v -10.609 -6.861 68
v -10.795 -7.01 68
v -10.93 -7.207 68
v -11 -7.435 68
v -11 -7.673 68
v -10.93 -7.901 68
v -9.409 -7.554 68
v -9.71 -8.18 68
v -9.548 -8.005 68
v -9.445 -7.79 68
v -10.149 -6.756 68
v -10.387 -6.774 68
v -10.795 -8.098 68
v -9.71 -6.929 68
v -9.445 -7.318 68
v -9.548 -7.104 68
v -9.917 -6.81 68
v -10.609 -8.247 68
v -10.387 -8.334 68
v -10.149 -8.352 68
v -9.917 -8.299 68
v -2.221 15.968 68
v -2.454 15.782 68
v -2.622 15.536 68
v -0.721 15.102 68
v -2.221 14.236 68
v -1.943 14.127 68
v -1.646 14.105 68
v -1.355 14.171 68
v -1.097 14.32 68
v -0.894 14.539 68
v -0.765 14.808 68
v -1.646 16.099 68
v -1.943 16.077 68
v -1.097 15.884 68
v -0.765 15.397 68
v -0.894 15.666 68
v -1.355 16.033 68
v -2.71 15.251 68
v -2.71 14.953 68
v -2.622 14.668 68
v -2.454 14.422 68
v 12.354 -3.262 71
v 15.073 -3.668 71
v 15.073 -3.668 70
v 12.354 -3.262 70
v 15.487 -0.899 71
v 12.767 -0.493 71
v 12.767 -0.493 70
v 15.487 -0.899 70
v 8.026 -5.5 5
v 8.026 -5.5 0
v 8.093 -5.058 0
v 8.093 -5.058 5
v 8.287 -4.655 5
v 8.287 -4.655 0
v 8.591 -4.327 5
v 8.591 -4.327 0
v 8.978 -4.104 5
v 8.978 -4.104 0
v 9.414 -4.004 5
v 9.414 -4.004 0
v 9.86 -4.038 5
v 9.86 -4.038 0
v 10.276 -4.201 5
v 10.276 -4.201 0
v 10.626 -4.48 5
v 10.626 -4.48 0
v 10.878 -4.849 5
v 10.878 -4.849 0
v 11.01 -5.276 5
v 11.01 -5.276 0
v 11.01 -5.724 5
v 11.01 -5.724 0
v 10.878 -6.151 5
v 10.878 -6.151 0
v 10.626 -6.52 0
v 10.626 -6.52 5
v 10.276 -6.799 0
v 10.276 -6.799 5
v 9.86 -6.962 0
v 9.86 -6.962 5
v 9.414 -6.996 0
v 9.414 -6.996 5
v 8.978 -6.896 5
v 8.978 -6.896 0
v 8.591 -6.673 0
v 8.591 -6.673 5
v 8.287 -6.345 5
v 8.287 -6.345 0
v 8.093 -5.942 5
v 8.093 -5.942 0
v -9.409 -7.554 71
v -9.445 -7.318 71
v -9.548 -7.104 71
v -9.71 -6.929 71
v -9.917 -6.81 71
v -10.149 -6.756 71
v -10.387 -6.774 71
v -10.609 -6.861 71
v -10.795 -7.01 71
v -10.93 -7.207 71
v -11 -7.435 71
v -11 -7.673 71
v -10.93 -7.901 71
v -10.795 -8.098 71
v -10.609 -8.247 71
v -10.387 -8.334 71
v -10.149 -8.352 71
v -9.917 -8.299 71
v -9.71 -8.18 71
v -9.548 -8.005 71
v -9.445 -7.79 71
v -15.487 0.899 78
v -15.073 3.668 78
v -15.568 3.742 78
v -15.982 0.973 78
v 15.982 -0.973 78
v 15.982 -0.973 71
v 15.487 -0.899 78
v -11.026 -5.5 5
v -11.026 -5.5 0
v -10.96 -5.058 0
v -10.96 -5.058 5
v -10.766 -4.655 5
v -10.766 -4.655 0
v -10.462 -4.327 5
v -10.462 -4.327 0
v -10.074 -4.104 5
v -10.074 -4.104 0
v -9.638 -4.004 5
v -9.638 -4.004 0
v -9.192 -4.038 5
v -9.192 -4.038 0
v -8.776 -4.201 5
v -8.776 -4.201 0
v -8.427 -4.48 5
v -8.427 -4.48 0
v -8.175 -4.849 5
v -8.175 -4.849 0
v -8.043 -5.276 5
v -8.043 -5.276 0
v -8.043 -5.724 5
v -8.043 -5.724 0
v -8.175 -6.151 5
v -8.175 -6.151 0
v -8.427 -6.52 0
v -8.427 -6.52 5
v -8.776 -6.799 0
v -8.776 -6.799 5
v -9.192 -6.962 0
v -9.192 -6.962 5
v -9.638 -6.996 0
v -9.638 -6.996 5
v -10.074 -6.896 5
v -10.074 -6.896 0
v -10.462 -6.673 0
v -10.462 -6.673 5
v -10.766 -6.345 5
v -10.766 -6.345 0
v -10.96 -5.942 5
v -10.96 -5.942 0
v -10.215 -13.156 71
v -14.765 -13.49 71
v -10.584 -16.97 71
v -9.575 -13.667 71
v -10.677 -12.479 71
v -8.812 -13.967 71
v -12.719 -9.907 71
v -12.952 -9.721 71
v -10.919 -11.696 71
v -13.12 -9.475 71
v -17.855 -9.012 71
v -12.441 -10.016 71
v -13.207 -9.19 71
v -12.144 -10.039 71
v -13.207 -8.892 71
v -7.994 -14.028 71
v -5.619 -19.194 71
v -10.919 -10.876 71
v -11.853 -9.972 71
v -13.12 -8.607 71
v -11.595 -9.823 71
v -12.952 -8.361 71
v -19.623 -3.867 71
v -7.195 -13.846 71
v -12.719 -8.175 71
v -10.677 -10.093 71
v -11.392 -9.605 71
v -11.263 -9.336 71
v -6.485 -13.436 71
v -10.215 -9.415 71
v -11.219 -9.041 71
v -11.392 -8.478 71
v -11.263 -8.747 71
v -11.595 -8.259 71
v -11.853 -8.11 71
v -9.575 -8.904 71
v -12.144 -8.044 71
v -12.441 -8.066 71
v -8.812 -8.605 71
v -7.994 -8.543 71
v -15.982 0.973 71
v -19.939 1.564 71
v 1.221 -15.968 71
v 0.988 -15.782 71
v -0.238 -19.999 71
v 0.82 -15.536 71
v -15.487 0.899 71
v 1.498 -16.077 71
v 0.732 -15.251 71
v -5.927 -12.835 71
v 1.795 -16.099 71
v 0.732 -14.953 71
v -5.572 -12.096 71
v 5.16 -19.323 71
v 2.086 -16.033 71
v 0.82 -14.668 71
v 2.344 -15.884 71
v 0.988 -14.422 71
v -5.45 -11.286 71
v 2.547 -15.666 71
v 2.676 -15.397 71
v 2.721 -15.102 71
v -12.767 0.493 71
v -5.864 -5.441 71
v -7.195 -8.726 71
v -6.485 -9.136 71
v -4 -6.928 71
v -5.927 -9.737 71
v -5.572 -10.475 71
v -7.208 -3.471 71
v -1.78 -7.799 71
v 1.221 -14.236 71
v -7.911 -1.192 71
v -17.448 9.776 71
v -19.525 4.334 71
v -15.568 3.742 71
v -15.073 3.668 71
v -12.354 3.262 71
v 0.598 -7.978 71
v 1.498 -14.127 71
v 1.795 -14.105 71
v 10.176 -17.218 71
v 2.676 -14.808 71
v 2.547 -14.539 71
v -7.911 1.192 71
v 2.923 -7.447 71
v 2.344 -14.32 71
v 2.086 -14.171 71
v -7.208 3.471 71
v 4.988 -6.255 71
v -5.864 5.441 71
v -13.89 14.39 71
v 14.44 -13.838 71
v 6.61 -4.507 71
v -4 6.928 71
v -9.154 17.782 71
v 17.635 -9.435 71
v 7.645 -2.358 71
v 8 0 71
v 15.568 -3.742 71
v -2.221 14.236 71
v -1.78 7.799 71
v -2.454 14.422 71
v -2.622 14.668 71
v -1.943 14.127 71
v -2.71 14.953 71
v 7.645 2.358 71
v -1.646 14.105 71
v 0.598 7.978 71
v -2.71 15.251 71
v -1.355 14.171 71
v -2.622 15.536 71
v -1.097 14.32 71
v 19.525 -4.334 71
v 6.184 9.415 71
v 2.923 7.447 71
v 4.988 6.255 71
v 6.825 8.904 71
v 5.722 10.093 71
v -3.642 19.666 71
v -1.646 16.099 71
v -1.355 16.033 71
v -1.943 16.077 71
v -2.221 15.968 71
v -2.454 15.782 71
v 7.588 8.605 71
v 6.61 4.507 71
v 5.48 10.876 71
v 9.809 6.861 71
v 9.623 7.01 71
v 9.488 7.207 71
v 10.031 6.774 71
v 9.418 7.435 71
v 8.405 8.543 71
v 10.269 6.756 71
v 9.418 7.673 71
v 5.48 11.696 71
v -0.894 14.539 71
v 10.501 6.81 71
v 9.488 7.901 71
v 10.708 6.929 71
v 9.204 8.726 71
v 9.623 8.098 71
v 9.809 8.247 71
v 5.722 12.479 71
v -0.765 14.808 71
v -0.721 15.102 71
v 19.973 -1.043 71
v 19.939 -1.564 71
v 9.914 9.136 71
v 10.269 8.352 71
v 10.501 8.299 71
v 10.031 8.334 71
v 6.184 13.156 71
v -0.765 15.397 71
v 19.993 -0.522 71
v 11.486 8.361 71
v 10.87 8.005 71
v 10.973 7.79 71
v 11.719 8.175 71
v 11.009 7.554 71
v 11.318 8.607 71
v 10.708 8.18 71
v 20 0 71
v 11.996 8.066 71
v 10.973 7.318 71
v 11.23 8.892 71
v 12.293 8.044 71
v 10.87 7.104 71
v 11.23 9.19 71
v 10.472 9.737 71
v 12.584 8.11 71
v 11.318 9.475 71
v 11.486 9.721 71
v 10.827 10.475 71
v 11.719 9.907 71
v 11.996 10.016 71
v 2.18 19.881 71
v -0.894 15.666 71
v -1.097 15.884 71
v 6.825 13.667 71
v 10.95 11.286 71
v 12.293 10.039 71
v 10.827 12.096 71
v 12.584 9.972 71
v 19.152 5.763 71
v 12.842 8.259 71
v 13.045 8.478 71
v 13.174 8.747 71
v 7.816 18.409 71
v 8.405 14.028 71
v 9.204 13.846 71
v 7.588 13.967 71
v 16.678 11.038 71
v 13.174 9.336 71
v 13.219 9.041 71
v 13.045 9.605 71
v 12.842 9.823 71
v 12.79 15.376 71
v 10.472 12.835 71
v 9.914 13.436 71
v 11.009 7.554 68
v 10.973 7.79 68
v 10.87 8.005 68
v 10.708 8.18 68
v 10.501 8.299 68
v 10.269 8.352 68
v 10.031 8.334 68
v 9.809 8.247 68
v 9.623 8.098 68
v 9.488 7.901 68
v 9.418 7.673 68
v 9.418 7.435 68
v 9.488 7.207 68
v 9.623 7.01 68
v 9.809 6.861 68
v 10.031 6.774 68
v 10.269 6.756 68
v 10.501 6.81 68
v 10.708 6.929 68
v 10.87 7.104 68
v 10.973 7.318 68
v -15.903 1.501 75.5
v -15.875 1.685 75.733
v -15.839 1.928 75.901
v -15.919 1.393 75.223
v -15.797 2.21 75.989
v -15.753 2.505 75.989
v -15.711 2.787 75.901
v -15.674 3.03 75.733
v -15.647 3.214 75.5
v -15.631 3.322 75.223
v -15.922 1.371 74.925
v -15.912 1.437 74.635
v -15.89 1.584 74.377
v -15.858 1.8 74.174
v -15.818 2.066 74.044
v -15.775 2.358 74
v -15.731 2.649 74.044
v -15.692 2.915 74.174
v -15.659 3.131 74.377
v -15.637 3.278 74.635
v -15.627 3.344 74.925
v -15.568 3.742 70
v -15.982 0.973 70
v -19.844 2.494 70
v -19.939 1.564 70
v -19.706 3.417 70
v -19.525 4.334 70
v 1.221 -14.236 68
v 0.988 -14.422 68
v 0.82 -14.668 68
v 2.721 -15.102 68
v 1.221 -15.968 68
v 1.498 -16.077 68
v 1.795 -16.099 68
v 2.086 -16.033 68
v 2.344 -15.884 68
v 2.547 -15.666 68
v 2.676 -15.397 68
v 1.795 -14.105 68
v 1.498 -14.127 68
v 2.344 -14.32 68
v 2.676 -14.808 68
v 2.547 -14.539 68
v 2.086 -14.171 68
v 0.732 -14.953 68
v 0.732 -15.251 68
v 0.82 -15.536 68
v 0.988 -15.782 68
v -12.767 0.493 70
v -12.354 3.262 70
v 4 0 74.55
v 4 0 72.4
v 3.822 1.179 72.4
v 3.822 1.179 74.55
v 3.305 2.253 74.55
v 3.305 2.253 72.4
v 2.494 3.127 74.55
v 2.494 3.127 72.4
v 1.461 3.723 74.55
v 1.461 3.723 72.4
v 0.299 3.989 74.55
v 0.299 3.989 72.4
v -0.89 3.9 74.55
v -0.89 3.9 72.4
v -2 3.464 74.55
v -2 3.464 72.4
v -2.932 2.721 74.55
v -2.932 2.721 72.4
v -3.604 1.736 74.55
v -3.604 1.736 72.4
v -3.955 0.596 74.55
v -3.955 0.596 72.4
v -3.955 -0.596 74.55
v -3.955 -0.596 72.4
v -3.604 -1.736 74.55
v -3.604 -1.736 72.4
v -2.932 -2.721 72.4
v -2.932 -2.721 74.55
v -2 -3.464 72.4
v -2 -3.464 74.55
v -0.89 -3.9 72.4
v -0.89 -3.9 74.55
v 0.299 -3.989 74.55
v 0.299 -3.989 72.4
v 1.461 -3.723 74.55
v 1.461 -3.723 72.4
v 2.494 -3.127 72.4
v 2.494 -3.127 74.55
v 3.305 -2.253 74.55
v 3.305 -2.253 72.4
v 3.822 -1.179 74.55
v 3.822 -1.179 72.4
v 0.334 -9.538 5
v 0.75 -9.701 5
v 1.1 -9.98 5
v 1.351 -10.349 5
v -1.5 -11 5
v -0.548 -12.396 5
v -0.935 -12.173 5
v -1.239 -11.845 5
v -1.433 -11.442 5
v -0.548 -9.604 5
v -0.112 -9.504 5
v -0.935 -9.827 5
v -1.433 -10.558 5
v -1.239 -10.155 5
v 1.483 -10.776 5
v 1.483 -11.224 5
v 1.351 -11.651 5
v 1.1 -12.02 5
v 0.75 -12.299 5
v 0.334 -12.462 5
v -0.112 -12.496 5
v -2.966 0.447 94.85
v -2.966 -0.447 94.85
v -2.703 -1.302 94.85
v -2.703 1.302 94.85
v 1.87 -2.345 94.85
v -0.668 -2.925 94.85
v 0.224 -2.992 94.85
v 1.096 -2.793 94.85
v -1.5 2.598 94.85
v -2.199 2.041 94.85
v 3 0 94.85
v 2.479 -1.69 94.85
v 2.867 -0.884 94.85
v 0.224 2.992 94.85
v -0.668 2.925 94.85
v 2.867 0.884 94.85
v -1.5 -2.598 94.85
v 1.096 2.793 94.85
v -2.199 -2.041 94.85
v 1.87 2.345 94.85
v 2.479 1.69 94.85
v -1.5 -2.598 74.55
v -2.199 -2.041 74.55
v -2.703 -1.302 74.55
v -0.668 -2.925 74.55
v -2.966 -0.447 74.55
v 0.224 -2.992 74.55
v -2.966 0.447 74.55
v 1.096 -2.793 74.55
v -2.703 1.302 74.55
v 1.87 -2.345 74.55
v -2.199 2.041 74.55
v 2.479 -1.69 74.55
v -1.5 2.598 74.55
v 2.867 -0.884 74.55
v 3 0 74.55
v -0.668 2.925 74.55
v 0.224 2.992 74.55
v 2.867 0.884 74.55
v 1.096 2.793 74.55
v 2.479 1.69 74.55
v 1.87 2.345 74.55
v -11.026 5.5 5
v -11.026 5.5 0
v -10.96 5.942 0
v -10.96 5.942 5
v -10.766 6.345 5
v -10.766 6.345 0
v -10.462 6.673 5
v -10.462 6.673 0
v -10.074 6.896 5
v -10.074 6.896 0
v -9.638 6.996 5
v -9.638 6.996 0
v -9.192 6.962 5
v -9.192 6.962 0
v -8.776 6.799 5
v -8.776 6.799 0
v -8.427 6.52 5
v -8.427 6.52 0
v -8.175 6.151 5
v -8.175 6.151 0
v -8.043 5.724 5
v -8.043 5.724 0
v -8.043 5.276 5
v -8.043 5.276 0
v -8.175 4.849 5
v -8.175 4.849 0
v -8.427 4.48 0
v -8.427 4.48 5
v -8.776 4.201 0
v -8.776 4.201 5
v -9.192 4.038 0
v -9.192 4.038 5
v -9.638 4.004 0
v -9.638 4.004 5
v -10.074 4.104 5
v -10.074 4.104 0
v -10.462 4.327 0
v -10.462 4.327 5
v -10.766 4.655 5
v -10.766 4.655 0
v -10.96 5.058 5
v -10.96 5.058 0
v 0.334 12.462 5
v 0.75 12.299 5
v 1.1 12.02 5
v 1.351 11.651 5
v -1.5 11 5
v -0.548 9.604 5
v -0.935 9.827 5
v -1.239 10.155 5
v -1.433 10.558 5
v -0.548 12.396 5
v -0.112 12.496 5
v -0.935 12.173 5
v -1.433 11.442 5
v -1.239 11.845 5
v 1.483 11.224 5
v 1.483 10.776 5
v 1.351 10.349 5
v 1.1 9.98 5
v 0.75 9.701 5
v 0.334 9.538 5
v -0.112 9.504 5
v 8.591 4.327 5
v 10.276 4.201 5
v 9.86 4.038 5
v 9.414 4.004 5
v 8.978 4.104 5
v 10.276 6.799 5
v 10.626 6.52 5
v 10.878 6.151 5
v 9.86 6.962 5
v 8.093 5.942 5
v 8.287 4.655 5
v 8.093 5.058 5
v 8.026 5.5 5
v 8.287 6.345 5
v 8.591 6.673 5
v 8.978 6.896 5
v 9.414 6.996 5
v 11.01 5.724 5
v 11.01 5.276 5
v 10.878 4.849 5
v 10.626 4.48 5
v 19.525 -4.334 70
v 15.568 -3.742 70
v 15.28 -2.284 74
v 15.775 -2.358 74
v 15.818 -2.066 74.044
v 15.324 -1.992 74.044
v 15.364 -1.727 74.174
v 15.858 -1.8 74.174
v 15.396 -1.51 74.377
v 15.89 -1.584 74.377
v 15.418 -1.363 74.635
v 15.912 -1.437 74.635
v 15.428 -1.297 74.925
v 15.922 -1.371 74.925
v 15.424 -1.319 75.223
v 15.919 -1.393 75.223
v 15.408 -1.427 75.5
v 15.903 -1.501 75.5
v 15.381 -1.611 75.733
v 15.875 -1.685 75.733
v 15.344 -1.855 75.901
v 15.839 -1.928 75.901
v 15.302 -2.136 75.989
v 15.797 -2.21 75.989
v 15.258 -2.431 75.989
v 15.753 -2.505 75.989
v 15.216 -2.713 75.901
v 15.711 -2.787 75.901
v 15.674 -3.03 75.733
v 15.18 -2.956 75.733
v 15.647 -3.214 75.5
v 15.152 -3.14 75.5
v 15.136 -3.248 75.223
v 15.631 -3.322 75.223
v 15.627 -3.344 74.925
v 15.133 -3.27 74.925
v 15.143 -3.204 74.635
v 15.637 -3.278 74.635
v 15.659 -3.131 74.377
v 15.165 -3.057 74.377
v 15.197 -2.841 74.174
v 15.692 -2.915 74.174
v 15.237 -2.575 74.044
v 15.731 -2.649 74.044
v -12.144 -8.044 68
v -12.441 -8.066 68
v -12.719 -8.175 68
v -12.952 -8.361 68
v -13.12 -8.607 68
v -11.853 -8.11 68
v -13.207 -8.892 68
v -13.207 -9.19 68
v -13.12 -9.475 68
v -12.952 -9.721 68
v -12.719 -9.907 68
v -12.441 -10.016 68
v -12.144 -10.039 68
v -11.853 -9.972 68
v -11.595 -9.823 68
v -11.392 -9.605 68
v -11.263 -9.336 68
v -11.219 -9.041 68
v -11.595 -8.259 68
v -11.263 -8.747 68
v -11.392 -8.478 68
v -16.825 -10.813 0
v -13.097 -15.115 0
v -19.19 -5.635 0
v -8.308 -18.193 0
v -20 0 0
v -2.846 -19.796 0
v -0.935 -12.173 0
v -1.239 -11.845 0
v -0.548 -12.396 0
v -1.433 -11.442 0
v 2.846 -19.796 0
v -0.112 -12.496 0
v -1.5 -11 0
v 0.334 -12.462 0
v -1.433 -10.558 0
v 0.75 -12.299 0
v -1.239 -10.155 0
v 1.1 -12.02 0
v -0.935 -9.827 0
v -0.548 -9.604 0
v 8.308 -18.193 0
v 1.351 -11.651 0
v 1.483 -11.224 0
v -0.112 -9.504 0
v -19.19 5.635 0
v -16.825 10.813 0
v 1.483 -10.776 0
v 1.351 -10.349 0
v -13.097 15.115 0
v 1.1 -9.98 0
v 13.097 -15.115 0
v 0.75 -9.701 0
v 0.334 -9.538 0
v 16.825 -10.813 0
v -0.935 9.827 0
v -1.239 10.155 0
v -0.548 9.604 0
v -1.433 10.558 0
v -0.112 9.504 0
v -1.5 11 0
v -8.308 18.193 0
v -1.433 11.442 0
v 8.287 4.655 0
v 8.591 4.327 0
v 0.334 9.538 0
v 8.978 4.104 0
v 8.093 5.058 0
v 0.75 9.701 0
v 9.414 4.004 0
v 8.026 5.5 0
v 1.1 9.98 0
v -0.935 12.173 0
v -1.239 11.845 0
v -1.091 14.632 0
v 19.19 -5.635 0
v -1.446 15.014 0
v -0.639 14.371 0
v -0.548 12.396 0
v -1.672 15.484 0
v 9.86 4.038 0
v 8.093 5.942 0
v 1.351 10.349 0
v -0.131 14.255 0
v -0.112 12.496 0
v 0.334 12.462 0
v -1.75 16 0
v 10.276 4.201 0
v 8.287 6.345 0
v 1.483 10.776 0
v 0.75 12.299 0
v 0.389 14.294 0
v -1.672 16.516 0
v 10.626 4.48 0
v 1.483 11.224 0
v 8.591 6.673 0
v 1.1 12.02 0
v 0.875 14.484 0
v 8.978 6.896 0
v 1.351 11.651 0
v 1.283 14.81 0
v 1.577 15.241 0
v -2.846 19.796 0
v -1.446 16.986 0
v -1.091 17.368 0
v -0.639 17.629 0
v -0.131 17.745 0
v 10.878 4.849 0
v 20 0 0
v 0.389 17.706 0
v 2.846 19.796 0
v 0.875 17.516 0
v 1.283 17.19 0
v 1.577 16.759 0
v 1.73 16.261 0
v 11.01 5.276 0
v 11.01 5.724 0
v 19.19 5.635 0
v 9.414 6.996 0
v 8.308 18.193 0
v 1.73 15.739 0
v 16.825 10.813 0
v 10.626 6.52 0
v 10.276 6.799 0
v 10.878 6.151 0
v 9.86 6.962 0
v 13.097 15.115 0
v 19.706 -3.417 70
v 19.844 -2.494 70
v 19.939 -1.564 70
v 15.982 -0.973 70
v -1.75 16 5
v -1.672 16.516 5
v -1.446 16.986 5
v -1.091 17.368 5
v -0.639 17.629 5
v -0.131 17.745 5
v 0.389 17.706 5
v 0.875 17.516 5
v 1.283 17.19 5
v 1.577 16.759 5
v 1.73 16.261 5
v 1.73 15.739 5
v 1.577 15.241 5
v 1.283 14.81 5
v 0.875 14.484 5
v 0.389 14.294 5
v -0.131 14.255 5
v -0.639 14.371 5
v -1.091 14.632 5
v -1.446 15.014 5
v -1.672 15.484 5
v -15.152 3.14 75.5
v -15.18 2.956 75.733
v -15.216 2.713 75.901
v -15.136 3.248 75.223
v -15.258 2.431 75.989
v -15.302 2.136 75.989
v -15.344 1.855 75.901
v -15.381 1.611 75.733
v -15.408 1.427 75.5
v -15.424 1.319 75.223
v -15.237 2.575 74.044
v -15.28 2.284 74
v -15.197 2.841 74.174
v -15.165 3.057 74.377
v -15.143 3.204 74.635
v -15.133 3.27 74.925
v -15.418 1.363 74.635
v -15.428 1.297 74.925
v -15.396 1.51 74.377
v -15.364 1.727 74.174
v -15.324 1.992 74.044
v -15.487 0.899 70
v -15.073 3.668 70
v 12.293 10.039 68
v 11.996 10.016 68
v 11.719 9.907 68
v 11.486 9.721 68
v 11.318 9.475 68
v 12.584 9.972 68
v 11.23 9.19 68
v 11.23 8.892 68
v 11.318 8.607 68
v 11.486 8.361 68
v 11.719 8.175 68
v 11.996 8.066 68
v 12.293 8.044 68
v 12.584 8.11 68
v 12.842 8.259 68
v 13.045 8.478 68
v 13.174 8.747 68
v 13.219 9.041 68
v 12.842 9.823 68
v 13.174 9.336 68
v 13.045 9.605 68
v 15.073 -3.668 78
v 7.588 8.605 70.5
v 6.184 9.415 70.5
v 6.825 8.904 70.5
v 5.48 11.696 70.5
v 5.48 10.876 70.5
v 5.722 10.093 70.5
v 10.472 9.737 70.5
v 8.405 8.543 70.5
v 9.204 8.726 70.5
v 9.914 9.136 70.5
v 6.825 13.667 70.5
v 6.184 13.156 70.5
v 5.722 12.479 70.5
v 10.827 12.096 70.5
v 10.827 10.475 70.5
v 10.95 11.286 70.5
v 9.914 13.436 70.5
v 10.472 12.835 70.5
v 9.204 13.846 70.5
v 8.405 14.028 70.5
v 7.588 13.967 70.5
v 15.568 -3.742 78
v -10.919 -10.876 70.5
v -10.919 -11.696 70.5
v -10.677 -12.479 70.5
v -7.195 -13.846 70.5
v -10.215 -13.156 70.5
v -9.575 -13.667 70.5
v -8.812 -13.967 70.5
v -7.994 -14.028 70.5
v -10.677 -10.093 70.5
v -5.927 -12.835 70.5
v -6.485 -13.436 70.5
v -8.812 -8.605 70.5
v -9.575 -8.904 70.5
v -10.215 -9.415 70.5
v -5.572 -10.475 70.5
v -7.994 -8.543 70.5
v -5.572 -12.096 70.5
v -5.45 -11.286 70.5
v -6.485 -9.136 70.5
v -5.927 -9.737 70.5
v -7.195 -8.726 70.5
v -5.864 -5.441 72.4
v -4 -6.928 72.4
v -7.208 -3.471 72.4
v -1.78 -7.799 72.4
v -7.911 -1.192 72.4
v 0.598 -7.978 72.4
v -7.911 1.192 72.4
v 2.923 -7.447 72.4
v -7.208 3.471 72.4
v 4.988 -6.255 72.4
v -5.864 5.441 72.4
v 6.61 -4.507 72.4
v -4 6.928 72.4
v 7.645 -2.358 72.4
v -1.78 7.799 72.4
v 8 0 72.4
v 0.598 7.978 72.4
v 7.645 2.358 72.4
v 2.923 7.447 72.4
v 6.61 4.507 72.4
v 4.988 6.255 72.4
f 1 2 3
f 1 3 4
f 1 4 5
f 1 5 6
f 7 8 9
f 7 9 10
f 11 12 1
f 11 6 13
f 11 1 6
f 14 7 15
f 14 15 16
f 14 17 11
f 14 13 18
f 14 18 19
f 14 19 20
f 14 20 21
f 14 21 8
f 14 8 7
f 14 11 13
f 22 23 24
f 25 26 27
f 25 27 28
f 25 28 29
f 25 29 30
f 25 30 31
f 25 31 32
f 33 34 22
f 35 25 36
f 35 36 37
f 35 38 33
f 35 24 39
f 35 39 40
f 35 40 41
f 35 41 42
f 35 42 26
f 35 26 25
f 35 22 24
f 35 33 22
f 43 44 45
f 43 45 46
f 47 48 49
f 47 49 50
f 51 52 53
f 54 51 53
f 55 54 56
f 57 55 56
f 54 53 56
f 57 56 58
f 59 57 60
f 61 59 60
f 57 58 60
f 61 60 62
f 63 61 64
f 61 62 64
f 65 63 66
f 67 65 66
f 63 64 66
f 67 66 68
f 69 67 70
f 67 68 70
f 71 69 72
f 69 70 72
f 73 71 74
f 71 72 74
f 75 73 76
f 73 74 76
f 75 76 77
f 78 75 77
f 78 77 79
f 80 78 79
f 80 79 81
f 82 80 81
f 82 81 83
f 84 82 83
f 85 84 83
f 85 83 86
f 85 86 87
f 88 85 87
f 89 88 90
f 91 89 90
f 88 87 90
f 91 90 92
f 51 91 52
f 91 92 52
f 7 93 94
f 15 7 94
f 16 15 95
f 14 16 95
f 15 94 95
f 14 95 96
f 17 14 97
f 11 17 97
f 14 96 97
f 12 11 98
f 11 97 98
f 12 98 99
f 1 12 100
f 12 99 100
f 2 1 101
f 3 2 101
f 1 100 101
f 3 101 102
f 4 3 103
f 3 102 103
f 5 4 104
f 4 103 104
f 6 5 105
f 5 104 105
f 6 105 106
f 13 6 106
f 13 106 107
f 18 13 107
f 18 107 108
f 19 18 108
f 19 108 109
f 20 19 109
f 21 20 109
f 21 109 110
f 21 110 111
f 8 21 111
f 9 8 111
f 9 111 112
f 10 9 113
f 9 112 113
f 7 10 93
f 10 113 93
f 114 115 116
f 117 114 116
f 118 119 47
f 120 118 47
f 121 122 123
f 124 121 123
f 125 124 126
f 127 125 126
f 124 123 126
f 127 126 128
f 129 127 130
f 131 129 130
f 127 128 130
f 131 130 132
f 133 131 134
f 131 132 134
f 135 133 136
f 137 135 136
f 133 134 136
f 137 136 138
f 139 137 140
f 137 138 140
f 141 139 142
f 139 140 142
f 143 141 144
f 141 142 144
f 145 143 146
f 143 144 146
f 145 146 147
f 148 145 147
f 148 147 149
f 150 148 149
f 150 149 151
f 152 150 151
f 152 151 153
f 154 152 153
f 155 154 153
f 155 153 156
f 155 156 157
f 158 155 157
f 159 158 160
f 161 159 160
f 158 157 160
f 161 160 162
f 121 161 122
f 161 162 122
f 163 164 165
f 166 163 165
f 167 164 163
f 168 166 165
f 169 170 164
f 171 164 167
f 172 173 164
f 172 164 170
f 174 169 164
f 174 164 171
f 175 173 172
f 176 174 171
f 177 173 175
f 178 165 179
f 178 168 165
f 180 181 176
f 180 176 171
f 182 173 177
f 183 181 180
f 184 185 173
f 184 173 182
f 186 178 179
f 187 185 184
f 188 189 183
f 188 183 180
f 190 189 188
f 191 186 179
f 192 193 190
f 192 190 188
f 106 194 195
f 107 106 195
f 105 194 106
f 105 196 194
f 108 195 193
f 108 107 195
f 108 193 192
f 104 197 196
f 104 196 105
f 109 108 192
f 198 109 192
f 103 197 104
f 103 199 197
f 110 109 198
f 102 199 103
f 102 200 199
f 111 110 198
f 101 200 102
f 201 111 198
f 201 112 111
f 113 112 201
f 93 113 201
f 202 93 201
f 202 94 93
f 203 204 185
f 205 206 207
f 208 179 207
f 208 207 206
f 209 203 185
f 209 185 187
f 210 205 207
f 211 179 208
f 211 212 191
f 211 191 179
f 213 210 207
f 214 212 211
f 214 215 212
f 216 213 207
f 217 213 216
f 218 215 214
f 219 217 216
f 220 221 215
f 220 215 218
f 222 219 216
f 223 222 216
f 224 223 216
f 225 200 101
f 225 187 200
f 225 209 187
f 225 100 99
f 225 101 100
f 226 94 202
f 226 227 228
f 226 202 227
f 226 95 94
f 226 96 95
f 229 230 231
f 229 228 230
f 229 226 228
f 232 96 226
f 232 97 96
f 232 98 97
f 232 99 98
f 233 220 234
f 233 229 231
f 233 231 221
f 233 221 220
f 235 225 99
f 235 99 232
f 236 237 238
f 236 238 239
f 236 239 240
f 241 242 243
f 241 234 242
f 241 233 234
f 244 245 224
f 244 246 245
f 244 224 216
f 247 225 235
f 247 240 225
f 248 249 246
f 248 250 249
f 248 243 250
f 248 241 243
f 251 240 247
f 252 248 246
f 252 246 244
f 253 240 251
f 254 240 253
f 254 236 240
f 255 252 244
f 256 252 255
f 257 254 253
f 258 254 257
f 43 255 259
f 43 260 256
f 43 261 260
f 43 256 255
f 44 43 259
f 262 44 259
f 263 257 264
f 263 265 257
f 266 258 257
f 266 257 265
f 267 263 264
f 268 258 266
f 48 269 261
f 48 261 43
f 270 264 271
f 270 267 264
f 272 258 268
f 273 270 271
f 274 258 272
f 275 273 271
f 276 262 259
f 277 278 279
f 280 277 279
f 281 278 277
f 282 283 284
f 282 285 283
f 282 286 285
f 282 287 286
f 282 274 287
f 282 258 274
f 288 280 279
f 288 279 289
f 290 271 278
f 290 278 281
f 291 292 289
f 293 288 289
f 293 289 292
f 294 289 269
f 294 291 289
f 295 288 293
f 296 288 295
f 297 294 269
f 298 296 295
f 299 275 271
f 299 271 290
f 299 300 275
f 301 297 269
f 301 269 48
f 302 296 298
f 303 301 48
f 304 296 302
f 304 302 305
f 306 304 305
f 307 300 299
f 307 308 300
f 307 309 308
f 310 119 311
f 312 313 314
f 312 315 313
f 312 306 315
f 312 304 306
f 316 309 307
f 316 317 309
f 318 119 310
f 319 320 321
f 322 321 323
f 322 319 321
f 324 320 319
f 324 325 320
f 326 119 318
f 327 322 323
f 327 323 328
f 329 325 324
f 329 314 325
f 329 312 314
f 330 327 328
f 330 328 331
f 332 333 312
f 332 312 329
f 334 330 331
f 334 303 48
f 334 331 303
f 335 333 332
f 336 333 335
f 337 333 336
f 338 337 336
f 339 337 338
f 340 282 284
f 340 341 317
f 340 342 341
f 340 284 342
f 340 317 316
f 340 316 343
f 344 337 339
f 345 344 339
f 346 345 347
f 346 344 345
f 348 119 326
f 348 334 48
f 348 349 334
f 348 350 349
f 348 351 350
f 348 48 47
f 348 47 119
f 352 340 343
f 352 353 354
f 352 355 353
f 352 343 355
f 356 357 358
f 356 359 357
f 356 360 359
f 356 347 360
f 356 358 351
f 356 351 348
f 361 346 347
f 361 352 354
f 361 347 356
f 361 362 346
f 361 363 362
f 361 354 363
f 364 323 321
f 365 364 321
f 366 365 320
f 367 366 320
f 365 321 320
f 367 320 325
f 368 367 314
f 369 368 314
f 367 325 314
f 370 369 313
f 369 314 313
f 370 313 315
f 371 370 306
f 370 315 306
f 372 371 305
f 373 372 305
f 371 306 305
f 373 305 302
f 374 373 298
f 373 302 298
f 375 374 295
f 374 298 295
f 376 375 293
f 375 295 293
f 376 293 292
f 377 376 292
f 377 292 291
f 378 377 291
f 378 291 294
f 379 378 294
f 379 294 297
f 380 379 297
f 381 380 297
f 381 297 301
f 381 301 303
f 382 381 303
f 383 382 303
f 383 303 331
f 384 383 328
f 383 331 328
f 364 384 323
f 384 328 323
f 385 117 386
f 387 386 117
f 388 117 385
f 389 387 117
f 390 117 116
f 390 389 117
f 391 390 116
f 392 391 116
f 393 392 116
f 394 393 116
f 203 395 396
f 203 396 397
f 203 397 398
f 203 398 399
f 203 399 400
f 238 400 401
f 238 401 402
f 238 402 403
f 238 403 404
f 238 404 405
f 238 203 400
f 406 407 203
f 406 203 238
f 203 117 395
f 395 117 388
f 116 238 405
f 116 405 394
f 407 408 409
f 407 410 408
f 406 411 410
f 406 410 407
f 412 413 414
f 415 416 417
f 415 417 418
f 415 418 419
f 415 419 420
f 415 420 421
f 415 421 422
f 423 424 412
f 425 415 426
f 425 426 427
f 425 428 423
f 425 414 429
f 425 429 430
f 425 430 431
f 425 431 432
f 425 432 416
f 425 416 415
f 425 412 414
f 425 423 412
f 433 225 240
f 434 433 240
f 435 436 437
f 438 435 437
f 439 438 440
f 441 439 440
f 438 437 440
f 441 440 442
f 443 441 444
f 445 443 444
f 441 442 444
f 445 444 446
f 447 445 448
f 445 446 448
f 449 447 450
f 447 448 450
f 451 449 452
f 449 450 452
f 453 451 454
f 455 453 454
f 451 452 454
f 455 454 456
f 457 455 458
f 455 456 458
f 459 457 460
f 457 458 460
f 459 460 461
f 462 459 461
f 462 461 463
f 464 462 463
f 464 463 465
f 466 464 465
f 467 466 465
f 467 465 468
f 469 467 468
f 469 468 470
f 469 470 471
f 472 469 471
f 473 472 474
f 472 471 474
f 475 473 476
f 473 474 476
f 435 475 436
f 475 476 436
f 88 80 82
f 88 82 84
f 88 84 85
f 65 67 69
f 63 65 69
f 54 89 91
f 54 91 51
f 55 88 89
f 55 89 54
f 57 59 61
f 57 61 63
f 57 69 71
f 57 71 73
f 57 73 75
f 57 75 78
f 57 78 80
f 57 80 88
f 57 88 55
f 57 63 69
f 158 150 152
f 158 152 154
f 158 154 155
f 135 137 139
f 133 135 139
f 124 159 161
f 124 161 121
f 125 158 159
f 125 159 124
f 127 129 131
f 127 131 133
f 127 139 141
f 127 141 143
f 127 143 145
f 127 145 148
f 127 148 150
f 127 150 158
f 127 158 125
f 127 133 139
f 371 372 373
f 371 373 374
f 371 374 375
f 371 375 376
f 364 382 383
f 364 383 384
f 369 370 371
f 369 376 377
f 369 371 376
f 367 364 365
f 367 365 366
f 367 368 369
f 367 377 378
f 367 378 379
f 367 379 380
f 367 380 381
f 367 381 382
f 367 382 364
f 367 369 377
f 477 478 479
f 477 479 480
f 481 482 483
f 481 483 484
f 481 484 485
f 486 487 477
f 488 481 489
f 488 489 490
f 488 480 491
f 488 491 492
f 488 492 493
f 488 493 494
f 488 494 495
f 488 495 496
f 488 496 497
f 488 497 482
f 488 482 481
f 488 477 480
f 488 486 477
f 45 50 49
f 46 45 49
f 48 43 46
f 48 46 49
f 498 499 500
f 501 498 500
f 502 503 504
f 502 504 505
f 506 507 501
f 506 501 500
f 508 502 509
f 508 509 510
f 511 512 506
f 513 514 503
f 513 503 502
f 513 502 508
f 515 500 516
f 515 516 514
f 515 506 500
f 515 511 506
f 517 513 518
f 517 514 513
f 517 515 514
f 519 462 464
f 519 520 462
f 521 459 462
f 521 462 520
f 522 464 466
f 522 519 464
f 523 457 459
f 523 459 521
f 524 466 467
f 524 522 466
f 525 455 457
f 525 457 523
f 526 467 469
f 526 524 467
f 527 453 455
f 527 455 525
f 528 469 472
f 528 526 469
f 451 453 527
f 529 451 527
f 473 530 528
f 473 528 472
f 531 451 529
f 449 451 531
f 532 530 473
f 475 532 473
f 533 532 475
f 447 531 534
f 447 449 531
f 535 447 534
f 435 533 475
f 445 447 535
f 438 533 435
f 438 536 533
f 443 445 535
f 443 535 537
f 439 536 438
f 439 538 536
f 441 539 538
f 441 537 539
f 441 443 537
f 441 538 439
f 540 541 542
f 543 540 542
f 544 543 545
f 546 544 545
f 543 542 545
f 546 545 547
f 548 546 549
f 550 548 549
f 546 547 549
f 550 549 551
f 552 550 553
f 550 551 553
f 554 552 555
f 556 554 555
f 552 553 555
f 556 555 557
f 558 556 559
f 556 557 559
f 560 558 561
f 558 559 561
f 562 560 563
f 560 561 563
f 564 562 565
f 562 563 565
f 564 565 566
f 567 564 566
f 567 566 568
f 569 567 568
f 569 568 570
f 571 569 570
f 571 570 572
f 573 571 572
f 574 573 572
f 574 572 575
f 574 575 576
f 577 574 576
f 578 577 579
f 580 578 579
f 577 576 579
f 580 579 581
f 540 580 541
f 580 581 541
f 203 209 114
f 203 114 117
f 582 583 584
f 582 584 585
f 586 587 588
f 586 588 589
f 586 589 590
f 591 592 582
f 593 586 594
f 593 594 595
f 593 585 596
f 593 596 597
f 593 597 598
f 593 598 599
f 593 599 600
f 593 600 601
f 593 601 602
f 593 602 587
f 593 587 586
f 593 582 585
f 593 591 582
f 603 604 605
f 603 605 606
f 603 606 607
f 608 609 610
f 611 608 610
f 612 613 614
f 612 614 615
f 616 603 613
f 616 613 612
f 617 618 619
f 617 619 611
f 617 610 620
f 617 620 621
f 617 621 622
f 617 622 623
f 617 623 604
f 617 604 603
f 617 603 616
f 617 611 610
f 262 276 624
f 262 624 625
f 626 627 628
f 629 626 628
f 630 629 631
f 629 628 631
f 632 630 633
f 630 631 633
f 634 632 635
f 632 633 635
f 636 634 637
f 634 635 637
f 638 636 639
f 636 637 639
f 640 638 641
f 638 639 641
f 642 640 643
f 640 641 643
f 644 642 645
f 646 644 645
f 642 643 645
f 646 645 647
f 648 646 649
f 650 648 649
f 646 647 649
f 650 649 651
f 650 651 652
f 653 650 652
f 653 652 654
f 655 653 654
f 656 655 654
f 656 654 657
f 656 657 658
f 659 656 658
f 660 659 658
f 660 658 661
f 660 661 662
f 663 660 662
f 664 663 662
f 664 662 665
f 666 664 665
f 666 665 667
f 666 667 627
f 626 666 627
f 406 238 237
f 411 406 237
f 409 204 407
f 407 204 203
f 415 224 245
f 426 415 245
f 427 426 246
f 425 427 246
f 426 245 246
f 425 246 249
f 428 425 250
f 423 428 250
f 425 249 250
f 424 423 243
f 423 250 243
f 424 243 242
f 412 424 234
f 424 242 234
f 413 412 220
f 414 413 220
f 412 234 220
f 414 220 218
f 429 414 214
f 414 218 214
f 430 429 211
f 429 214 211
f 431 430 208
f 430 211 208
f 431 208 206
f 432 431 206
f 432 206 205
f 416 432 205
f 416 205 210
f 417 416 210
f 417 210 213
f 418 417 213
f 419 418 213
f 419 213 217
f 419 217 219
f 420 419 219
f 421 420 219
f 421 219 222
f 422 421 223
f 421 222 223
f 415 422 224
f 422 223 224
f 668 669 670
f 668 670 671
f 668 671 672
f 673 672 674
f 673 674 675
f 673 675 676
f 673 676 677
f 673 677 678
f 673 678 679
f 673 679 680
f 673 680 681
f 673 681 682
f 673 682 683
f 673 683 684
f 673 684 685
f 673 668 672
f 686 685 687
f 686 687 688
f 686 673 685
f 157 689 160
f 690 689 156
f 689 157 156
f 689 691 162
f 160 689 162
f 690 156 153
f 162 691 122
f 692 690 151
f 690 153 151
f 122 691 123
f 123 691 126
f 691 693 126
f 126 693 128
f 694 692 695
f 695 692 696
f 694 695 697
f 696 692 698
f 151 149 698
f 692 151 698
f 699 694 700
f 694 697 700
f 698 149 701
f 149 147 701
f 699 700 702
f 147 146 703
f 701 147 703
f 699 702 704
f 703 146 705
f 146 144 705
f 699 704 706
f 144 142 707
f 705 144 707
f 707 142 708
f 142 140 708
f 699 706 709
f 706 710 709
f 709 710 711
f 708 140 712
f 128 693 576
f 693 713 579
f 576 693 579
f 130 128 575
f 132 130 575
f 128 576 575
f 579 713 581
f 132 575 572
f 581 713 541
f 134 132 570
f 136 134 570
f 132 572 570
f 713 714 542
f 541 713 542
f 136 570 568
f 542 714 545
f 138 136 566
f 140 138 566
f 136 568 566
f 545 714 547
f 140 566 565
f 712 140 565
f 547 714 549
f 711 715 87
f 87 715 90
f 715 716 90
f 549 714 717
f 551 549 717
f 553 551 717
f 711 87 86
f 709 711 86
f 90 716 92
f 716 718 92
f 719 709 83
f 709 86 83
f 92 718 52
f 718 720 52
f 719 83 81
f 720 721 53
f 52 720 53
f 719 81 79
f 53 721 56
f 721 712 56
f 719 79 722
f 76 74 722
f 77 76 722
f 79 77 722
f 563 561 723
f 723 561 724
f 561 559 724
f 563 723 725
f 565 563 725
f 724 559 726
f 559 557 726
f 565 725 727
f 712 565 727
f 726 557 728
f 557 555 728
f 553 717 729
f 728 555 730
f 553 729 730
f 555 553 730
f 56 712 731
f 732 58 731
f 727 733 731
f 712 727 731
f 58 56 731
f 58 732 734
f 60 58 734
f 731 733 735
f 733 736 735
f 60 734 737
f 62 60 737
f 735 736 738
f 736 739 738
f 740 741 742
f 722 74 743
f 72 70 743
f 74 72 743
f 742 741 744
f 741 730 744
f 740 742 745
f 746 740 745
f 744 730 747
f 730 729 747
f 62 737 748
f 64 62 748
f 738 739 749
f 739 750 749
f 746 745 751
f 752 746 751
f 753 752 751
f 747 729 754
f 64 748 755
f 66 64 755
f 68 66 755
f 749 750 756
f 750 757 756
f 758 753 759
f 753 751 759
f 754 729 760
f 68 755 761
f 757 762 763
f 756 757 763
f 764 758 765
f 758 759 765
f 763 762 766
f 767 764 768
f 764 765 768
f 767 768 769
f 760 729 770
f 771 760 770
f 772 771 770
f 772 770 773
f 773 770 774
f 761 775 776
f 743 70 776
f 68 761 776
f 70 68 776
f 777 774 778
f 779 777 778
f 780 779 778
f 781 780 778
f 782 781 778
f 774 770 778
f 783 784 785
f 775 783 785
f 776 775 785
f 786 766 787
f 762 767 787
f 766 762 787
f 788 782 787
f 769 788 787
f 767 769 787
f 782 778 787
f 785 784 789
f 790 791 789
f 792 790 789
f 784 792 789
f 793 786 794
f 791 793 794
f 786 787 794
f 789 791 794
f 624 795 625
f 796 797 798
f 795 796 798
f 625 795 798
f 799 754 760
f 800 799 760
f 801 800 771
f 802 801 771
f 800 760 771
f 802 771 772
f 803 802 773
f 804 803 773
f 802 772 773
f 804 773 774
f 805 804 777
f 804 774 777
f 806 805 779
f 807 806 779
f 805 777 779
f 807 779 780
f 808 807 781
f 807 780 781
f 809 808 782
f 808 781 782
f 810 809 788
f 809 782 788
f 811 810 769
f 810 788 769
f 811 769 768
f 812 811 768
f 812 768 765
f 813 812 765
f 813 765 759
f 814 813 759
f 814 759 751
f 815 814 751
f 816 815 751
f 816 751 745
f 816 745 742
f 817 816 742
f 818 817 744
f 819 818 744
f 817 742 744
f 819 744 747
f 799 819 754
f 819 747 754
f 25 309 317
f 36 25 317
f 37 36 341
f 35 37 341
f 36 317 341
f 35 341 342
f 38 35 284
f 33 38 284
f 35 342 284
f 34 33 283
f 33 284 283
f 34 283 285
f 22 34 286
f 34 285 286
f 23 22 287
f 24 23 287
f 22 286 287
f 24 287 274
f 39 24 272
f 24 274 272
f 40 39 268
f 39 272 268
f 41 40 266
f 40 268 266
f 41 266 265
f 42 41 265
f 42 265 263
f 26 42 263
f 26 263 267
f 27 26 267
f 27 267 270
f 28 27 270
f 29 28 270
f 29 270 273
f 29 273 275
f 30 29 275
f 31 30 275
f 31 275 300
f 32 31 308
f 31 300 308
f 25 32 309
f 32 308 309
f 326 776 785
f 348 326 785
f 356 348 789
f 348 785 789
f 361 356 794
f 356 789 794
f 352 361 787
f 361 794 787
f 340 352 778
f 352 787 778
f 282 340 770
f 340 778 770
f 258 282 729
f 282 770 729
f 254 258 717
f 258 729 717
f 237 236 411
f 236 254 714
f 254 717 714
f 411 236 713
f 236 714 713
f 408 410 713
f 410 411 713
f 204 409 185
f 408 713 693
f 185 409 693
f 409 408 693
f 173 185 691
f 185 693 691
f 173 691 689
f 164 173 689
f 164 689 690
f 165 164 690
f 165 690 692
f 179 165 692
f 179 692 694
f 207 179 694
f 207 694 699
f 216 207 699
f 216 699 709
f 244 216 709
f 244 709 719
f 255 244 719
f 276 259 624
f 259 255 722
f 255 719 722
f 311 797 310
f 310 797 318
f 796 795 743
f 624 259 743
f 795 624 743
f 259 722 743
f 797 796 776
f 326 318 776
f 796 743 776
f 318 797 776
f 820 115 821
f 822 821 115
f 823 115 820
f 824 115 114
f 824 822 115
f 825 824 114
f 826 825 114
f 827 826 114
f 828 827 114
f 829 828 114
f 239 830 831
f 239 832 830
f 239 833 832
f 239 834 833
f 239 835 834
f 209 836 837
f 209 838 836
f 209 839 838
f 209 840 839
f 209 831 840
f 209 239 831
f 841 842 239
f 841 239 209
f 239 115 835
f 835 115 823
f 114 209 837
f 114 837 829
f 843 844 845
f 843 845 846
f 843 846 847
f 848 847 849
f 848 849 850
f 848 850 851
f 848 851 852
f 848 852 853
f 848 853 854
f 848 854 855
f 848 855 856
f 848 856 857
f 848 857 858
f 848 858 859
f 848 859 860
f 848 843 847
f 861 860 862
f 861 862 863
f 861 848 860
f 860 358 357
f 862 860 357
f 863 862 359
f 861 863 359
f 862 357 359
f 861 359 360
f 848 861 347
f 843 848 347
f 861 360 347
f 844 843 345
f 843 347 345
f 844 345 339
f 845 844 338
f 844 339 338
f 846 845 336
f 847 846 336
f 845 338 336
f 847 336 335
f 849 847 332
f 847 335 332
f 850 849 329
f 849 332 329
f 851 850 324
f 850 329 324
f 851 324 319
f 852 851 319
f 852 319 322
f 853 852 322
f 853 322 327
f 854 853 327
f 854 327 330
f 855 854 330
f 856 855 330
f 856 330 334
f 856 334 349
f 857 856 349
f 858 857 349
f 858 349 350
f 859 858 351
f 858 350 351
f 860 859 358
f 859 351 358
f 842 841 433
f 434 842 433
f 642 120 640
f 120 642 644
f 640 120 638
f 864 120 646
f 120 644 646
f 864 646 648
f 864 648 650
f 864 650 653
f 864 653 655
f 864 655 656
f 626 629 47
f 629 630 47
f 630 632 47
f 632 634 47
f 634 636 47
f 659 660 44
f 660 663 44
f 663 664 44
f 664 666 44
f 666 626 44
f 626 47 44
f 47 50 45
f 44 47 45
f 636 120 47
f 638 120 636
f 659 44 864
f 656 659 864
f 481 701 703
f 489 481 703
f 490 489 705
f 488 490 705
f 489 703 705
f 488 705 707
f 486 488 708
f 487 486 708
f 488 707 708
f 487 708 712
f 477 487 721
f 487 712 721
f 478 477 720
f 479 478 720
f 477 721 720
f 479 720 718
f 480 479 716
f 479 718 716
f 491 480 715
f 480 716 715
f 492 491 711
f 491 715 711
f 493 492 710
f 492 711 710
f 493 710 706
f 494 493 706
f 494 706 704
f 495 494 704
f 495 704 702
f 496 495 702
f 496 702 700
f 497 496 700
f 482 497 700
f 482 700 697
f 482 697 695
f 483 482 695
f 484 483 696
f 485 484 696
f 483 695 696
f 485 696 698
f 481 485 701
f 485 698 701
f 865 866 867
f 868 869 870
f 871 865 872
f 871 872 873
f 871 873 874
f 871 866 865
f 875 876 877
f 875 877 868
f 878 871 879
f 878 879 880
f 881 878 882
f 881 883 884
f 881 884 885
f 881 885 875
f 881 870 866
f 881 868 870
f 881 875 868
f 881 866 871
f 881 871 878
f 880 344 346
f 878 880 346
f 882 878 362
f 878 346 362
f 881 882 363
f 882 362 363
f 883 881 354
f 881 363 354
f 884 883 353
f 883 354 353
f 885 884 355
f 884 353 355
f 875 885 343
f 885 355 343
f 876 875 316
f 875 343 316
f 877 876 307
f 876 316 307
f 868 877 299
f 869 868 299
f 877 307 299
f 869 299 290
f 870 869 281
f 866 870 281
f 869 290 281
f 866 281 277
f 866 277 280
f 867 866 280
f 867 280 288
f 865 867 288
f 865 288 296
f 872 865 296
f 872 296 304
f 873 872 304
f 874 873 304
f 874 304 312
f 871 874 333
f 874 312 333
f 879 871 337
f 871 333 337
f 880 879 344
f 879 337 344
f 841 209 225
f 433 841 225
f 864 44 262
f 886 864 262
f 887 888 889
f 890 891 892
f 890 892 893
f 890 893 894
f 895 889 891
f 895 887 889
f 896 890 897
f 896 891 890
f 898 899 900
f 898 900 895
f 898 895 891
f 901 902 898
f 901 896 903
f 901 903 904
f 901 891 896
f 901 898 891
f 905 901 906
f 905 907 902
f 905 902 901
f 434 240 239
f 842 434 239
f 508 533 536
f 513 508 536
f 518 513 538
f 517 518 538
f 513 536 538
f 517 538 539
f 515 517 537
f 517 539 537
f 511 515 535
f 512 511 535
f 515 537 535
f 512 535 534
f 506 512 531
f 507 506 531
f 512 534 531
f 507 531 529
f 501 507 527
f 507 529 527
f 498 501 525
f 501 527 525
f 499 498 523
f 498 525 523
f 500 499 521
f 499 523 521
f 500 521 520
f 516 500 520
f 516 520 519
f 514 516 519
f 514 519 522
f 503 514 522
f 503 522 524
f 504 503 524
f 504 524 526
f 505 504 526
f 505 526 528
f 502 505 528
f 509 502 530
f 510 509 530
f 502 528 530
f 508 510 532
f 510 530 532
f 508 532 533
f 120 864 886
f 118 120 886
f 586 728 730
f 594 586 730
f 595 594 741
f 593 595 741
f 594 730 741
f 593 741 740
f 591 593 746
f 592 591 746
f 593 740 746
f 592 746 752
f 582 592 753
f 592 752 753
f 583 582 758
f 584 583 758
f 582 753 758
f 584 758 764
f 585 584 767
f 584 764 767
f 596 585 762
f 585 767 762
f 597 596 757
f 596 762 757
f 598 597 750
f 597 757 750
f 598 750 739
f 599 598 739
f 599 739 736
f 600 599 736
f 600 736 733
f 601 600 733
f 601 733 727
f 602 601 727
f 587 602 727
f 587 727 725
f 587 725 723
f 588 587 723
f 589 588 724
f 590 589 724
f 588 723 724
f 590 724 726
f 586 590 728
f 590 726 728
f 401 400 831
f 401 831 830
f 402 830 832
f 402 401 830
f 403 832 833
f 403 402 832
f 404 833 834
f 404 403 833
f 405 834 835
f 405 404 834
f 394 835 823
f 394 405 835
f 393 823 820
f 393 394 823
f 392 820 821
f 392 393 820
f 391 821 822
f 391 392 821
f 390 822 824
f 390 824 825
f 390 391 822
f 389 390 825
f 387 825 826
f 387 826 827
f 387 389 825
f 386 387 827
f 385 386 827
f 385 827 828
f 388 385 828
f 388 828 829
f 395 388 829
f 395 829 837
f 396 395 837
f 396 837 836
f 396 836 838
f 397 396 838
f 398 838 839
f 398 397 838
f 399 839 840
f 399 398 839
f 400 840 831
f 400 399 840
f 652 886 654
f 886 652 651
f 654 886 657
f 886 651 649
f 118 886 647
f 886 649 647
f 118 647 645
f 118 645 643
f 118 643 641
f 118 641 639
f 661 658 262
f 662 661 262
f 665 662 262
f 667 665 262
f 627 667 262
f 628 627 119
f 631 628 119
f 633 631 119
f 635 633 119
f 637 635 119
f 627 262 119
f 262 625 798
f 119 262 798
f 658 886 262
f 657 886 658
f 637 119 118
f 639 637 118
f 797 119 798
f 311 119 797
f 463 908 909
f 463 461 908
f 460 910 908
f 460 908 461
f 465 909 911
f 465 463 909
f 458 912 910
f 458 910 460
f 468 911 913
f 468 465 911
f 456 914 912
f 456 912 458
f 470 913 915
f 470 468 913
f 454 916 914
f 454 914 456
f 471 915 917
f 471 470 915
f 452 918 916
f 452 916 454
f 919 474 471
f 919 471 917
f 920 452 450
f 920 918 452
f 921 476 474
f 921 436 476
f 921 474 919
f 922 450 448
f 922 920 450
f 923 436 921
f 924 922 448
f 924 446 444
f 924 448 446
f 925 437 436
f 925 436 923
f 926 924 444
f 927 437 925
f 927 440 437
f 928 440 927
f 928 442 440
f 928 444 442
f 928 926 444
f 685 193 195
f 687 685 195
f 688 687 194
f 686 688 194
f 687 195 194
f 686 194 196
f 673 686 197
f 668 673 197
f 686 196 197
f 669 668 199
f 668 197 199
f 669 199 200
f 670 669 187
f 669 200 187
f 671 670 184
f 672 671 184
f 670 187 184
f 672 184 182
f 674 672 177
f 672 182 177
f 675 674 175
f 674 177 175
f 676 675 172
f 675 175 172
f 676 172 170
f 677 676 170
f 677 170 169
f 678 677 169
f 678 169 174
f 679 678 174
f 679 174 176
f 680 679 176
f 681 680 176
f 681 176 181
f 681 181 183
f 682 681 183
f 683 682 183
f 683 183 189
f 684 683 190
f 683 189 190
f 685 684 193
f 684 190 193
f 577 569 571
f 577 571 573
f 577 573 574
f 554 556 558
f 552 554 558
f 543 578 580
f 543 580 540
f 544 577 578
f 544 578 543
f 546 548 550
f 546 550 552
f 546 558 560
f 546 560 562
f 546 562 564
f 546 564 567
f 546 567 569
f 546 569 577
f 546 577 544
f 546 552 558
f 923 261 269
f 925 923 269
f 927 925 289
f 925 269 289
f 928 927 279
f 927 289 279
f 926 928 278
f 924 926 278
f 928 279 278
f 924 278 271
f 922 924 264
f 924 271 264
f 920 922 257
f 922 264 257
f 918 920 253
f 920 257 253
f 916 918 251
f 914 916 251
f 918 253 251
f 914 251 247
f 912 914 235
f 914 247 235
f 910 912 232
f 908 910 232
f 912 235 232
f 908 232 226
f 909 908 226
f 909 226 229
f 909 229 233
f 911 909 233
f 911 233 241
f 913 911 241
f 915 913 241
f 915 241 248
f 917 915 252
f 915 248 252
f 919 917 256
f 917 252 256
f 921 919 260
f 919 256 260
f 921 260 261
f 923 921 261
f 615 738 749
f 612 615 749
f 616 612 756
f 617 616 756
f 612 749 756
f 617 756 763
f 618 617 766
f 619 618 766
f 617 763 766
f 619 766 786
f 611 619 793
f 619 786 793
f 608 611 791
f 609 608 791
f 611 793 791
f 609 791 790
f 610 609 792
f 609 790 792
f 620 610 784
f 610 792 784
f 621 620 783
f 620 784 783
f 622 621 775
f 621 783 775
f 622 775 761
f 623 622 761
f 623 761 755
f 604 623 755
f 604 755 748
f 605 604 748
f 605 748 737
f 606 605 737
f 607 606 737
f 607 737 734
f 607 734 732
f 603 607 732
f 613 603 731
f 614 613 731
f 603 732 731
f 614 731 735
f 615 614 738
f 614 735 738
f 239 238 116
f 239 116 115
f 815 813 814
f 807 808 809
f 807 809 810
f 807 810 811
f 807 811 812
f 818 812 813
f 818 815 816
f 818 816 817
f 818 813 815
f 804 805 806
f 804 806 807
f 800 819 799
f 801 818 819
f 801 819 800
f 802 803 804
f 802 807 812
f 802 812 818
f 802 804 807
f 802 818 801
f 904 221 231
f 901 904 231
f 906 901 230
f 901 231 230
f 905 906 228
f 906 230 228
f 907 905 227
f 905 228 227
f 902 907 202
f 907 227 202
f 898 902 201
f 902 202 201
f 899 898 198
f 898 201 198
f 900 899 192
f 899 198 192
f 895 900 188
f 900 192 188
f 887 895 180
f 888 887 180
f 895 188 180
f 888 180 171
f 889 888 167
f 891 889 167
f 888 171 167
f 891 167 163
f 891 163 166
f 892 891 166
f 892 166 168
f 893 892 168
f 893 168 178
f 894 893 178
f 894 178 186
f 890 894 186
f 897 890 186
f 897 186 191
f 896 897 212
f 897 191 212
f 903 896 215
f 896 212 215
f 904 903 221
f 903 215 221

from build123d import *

# Parameters (mm, degrees)
SKETCH1_R           = 20
BOSS_EXTRUDE1_DEPTH = 71
SKETCH2_R           = 8
BOSS_EXTRUDE2_DEPTH = 1.4
SKETCH3_R           = 4
BOSS_EXTRUDE3_DEPTH = 2.15
SKETCH4_R           = 3
BOSS_EXTRUDE4_DEPTH = 20.3
SKETCH5_R           = 1
SKETCH5_R_2         = 0.8
CUT_EXTRUDE1_DEPTH  = 3
CUT_EXTRUDE2_DEPTH  = 1
BOSS_EXTRUDE5_DEPTH = 8
SKETCH8_R           = 2.75
CUT_EXTRUDE3_DEPTH  = 0.5
CUT_EXTRUDE4_REACH  = 105.809
SKETCH9_R           = 1
CUT_EXTRUDE5_REACH  = 137.209
CUT_EXTRUDE5_START  = -31.4
SKETCH9_2_R         = 1
SKETCH10_R          = 1.5
SKETCH10_R_2        = 1.75
CUT_EXTRUDE6_DEPTH  = 5


with BuildPart() as part:
    # Sketch1 → Boss-Extrude1 (new body)
    with BuildSketch(Plane.XY):
        Circle(SKETCH1_R)
    extrude(amount=BOSS_EXTRUDE1_DEPTH)

    # Sketch2 → Boss-Extrude2 (add)
    with BuildSketch(Plane.XY.offset(71)):
        Circle(SKETCH2_R)
    extrude(amount=BOSS_EXTRUDE2_DEPTH)

    # Sketch3 → Boss-Extrude3 (add)
    with BuildSketch(Plane.XY.offset(72.4)):
        Circle(SKETCH3_R)
    extrude(amount=BOSS_EXTRUDE3_DEPTH)

    # Sketch4 → Boss-Extrude4 (add)
    with BuildSketch(Plane.XY.offset(74.55)):
        Circle(SKETCH4_R)
    extrude(amount=BOSS_EXTRUDE4_DEPTH)

    # Sketch5 → Cut-Extrude1 (cut)
    with BuildSketch(Plane.XY.offset(71)):
        with Locations((12.218624281, 9.041306359)):
            Circle(SKETCH5_R)
        with Locations((-12.218624281, -9.041306359)):
            Circle(SKETCH5_R)
        with Locations((-1.720688849, 15.102292206)):
            Circle(SKETCH5_R)
        with Locations((1.720688849, -15.102292206)):
            Circle(SKETCH5_R)
        with Locations((10.20898213, 7.554249392)):
            Circle(SKETCH5_R_2)
        with Locations((-10.20898213, -7.554249392)):
            Circle(SKETCH5_R_2)
    extrude(amount=-CUT_EXTRUDE1_DEPTH, mode=Mode.SUBTRACT)

    # Sketch6 → Cut-Extrude2 (cut)
    with BuildSketch(Plane.XY.offset(71)):
        Polygon((-19.987250443, 1.571566014), (-12.76743464, 0.492557313), (-12.353568289, 3.26180173), (-19.573384092, 4.340810431), align=None)
        Polygon((19.573384092, -4.340810431), (12.353568289, -3.26180173), (12.76743464, -0.492557313), (19.987250443, -1.571566014), align=None)
    extrude(amount=-CUT_EXTRUDE2_DEPTH, mode=Mode.SUBTRACT)

    # Sketch7 → Boss-Extrude5 (add)
    with BuildSketch(Plane.XY.offset(70)):
        Polygon((-15.981736196, 0.972937899), (-15.567869845, 3.742182316), (-15.073361913, 3.668277611), (-15.487228265, 0.899033193), align=None)
        Polygon((15.567869845, -3.742182316), (15.981736196, -0.972937899), (15.487228265, -0.899033193), (15.073361913, -3.668277611), align=None)
    extrude(amount=BOSS_EXTRUDE5_DEPTH)

    # Sketch8 → Cut-Extrude3 (cut)
    with BuildSketch(Plane.XY.offset(71)):
        with Locations((8.199604269, 11.285787072)):
            Circle(SKETCH8_R)
        with Locations((-8.199604269, -11.285787072)):
            Circle(SKETCH8_R)
    extrude(amount=-CUT_EXTRUDE3_DEPTH, mode=Mode.SUBTRACT)

    # Sketch9 → Cut-Extrude4 (cut, up to next)
    with BuildSketch(Plane(origin=(15.774803021, -2.357560108, 0), x_dir=(0, 0, -1), z_dir=(0.9890158633619179, -0.147809411129604, 0)), mode=Mode.PRIVATE) as cut_extrude4_sk1:
        with Locations((-75, 0)):
            Circle(SKETCH9_R)
    cut_extrude4_tool1 = extrude(cut_extrude4_sk1.sketch, amount=-CUT_EXTRUDE4_REACH, mode=Mode.PRIVATE) & part.part
    add(cut_extrude4_tool1.solids().sort_by_distance((15.774803, -2.35756, 75))[0], mode=Mode.SUBTRACT)

    # Sketch9<2> → Cut-Extrude5 (cut, up to next)
    with BuildSketch(Plane(origin=(15.774803021, -2.357560108, 0), x_dir=(0, 0, -1), z_dir=(0.9890158633619179, -0.147809411129604, 0)).offset(CUT_EXTRUDE5_START), mode=Mode.PRIVATE) as cut_extrude5_sk1:
        with Locations((-75, 0)):
            Circle(SKETCH9_2_R)
    cut_extrude5_tool1 = extrude(cut_extrude5_sk1.sketch, amount=-CUT_EXTRUDE5_REACH, mode=Mode.PRIVATE) & part.part
    add(cut_extrude5_tool1.solids().sort_by_distance((-15.280295, 2.283655, 75))[0], mode=Mode.SUBTRACT)

    # Sketch10 → Cut-Extrude6 (cut)
    with BuildSketch(Plane(origin=(0, 0, 0), x_dir=(-1, 0, 0), z_dir=(0, 0, -1))):
        with Locations((0, 11)):
            Circle(SKETCH10_R)
        with Locations((9.526279442, 5.5)):
            Circle(SKETCH10_R)
        with Locations((9.526279442, -5.5)):
            Circle(SKETCH10_R)
        with Locations((0, -11)):
            Circle(SKETCH10_R)
        with Locations((-9.526279442, -5.5)):
            Circle(SKETCH10_R)
        with Locations((-9.526279442, 5.5)):
            Circle(SKETCH10_R)
        with Locations((0, 16)):
            Circle(SKETCH10_R_2)
    extrude(amount=-CUT_EXTRUDE6_DEPTH, mode=Mode.SUBTRACT)


solid = part.part
